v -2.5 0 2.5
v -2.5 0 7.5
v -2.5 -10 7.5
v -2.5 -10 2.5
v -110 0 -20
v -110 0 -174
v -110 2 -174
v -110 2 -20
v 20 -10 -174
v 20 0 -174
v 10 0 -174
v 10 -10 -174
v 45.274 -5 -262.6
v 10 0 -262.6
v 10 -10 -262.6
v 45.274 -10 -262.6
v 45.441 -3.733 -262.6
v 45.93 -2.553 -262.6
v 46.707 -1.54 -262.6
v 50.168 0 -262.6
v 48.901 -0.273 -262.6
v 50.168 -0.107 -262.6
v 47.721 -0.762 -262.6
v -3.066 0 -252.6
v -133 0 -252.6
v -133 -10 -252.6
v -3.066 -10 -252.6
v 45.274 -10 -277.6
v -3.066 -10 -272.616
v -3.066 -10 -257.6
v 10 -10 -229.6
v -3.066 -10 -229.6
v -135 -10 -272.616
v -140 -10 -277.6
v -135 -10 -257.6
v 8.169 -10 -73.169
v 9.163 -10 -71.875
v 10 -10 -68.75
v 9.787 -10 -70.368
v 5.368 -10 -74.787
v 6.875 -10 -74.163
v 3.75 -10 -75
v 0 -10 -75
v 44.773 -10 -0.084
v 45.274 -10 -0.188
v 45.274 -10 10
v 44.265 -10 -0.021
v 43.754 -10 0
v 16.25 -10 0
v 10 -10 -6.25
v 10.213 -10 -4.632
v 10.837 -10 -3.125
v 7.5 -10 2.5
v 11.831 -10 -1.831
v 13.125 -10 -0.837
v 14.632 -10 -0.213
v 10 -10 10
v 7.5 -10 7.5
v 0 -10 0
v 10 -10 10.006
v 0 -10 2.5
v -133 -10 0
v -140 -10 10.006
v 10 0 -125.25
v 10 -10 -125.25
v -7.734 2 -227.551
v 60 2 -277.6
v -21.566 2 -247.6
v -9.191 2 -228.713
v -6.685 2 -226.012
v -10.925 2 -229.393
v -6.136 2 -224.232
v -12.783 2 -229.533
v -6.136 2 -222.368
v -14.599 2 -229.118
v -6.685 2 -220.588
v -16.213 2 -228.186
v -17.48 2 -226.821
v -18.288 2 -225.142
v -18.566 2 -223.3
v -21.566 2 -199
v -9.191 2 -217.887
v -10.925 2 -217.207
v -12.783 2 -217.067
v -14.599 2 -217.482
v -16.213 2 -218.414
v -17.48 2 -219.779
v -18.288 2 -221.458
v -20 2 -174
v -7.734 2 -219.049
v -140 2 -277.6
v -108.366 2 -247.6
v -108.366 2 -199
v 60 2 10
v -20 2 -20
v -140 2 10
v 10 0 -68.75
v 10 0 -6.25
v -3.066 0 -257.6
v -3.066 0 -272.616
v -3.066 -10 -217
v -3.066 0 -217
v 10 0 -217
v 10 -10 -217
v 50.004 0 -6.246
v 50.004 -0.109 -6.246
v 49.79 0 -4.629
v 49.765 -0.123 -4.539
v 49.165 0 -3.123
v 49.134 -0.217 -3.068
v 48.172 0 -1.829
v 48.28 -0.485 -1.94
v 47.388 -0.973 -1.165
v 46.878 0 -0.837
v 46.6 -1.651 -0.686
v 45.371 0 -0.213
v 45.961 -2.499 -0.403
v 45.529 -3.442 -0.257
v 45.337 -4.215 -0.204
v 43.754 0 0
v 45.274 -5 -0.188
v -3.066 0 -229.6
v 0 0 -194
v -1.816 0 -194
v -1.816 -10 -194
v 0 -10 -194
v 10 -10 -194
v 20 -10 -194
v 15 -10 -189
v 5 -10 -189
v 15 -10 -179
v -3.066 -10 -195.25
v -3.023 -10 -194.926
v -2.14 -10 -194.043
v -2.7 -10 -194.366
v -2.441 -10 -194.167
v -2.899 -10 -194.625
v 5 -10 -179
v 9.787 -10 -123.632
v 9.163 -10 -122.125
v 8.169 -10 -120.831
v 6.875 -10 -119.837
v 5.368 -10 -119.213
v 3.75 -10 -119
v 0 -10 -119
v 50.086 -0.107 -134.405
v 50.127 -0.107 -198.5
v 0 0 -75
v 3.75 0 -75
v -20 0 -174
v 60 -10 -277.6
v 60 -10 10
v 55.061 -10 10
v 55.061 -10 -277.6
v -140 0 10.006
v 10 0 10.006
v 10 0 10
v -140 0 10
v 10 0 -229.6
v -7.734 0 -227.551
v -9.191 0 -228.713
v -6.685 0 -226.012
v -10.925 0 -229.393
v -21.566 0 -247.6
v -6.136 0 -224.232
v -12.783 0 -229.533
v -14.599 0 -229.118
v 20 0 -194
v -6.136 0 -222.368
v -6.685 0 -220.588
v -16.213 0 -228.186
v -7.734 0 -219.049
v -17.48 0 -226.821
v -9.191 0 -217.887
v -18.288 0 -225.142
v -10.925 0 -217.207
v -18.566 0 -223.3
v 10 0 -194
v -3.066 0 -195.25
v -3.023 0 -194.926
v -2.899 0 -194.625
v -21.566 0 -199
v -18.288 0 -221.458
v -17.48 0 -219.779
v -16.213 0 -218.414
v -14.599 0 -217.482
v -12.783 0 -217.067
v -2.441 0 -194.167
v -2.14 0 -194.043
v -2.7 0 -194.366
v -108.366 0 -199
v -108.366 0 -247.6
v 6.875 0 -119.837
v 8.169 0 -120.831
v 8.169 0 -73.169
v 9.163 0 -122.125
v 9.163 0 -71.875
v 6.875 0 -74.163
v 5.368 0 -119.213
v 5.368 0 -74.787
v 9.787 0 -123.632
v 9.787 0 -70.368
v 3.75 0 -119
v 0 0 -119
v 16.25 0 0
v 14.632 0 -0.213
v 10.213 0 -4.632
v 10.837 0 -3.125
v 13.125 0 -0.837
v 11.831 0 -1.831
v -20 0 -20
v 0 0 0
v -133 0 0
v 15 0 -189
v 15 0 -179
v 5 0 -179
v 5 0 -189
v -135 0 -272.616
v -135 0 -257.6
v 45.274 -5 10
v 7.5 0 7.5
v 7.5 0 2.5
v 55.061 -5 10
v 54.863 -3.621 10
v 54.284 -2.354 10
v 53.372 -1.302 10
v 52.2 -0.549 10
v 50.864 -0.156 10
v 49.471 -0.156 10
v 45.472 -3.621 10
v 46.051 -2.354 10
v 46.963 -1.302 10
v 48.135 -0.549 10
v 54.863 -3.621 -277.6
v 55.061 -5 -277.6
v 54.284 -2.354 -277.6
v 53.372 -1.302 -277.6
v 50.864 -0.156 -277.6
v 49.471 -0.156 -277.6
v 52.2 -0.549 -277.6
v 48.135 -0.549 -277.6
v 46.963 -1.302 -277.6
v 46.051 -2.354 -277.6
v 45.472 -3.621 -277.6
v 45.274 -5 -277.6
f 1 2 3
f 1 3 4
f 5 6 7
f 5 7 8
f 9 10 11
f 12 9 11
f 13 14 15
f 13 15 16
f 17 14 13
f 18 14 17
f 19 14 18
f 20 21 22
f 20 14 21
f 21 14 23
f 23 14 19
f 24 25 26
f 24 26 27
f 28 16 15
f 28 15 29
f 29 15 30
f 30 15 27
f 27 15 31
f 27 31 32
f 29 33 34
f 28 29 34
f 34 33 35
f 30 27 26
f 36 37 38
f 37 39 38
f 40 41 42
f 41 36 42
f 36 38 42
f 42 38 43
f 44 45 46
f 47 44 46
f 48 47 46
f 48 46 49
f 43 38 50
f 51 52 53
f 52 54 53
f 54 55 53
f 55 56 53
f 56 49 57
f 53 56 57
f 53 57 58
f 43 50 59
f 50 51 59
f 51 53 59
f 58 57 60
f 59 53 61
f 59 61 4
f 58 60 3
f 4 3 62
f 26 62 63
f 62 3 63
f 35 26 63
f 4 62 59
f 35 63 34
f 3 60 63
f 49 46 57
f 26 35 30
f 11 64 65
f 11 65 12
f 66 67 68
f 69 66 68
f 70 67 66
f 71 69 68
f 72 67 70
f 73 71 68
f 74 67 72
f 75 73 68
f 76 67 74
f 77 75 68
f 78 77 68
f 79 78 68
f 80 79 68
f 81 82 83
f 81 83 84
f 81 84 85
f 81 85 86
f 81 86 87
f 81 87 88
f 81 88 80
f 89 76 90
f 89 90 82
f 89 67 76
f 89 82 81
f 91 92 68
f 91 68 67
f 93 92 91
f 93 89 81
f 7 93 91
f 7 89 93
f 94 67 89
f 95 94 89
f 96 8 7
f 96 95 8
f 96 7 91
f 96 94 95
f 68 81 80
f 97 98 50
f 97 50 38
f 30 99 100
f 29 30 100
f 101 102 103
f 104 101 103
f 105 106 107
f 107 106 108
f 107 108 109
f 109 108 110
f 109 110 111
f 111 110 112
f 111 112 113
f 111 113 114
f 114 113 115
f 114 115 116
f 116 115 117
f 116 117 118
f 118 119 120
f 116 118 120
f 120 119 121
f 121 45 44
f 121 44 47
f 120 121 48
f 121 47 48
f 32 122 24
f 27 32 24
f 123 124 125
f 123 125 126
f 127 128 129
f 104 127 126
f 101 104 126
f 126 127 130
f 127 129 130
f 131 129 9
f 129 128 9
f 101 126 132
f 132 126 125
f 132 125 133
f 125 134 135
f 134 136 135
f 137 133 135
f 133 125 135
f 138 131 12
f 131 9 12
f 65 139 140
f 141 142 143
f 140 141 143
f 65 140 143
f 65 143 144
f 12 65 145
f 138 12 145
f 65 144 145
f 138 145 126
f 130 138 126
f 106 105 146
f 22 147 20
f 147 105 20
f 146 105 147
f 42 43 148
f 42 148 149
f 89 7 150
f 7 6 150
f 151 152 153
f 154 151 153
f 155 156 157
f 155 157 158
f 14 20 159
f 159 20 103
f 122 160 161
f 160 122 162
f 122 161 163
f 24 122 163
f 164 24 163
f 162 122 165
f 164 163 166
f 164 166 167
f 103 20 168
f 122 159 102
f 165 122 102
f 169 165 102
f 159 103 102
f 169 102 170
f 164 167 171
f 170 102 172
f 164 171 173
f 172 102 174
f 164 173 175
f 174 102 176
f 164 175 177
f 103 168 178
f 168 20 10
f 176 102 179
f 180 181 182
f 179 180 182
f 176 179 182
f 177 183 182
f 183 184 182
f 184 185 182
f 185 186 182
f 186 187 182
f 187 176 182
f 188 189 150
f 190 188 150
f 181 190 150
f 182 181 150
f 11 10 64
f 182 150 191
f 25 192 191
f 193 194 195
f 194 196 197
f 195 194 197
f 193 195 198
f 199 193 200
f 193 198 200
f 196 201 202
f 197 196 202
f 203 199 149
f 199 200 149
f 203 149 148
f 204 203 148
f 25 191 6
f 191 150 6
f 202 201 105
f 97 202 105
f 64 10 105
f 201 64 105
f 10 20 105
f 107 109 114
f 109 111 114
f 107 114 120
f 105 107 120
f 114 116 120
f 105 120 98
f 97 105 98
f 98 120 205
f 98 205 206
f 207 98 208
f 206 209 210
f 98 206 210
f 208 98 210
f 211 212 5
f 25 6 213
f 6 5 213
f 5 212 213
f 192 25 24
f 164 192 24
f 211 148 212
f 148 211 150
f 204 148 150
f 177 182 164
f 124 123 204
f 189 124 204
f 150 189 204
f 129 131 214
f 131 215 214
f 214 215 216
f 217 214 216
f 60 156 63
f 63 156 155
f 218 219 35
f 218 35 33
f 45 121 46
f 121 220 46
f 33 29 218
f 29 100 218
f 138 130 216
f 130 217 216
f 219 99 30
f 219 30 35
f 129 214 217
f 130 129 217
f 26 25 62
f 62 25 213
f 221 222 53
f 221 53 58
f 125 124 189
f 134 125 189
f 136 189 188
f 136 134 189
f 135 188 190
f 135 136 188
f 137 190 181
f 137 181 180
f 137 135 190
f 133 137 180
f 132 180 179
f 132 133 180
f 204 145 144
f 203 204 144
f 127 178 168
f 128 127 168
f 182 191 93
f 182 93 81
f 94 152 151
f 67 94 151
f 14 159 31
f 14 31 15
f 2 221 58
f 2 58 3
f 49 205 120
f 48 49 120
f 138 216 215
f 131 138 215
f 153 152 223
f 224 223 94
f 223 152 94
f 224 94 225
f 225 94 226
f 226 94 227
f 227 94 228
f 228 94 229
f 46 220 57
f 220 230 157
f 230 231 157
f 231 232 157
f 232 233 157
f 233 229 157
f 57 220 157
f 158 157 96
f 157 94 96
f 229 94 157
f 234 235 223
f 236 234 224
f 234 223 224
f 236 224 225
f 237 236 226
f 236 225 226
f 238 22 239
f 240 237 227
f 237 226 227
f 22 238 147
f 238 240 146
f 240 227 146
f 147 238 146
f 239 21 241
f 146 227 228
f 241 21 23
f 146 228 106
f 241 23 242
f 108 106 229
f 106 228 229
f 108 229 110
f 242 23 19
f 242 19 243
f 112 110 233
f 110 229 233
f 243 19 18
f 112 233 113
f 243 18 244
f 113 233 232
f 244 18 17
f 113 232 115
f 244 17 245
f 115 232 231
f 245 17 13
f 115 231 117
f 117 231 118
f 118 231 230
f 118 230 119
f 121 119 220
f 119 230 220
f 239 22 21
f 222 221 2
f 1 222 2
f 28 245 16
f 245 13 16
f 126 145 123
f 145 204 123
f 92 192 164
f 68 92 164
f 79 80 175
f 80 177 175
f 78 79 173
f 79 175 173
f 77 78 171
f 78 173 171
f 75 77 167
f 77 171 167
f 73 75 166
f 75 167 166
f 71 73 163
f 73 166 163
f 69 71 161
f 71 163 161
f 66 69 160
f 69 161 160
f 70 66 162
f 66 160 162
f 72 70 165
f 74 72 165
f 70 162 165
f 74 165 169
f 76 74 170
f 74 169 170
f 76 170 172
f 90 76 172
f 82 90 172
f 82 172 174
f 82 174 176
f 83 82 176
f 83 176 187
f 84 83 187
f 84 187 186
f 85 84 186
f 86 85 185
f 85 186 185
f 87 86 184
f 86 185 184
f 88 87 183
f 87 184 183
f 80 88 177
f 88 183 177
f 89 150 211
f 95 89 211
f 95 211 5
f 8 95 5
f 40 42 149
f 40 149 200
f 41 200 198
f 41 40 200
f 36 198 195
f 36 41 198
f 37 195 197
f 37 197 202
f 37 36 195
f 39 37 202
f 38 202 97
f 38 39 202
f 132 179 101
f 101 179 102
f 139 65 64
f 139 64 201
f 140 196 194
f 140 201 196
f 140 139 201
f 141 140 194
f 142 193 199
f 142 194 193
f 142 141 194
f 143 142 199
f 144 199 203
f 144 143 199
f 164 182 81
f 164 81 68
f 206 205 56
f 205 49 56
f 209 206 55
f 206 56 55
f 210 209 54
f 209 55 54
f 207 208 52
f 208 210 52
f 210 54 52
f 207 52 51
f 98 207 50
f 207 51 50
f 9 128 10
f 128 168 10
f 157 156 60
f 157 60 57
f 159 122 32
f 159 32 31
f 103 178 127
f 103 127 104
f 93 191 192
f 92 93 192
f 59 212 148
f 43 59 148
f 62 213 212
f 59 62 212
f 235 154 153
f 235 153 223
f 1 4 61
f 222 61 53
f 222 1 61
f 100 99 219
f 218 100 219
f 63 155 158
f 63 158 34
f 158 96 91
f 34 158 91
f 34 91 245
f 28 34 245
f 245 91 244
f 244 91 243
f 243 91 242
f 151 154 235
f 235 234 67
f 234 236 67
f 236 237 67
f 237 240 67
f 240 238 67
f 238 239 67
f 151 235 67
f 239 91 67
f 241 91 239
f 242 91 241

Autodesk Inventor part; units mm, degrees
ref_plane "YZ Plane" through (0, 0, 0) normal (1, 0, 0) x (0, 1, 0)
ref_plane "XZ Plane" through (0, 0, 0) normal (0, 1, 0) x (-1, 0, 0)
ref_plane "XY Plane" through (0, 0, 0) normal (0, 0, 1) x (1, 0, 0)
sketch "Sketch1" plane through (0, 0, 0) normal (0, 1, 0) x (-1, 0, 0)
  line L0 (0, 0) -> (0, -194)
  line L1 (0, -194) -> (130, -194)
  line L2 (130, -194) -> (130, 0)
  line L3 (130, 0) -> (0, 0)
  line L4 (0, -194) -> (123.8, -194)
  line L5 (126.866, -194) -> (126.866, -252.6)
  line L6 (126.866, -252.6) -> (3.066, -252.6)
  line L7 (3.066, -252.6) -> (3.066, -194)
  line L8 (140, 0) -> (140, -262.6)
  line L9 (140, -262.6) -> (0, -262.6)
  line L10 (140, 0) -> (140, 10)
  line L11 (-10, 0) -> (-10, -262.6)
  line L12 (-10, -262.6) -> (3.066, -262.6)
  line L13 (140, 10) -> (-10, 10)
  line L14 (-10, 10) -> (-10, 0)
  line L15 (-10, 10) -> (-60, 10)
  line L16 (-60, 10) -> (-60, -262.6)
  line L17 (-60, -262.6) -> (-10, -262.6)
  line L18 (108.366, -194) -> (108.366, -247.6)
  line L19 (21.566, -199) -> (21.566, -247.6)
  line L20 (110, -150.1456) -> (110, -20)
  line L21 (110, -174) -> (20, -174)
  line L22 (110, -174) -> (110, -150.1456)
  line L23 (102.8172, -20) -> (110, -20)
  line L24 (102.8172, -20) -> (20, -20)
  line L25 (20, -41.8625) -> (20, -20)
  line L26 (20, -41.8625) -> (20, -174)
  line L27 (21.566, -199) -> (21.566, -200.5)
  line L28 (108.366, -199) -> (21.566, -199)
  line L29 (108.366, -252.6) -> (108.366, -247.6)
  line L30 (108.366, -247.6) -> (21.566, -247.6)
  line L31 (21.566, -194) -> (12.316, -194)
  line L32 (12.316, -217.05) -> (12.316, -223.3)
  circle A0 centre (12.316, -223.3) radius 6.25
  line L33 (130, -194) -> (130, -252.6)
  line L34 (130, -252.6) -> (126.866, -252.6)
  line L35 (0, -194) -> (0, -252.6)
  line L36 (0, -252.6) -> (3.066, -252.6)
  line L37 (102.8172, -247.6) -> (102.8172, -267.6)
  line L38 (102.8172, -267.6) -> (140, -267.6)
  line L39 (140, -267.6) -> (140, -262.6)
  line L40 (102.8172, -267.6) -> (0, -267.6)
  line L41 (0, -267.6) -> (0, -252.6)
  line L42 (130, -252.6) -> (130, -267.6)
  line L43 (126.866, -252.6) -> (126.866, -267.6)
  line L44 (3.066, -252.6) -> (3.066, -267.6)
  line L45 (3.066, -194) -> (3.066, -217)
  line L46 (3.066, -252.6) -> (3.066, -229.6)
  line L47 (3.066, -217) -> (0, -217)
  line L48 (3.066, -229.6) -> (0, -229.6)
  line L49 (0, -217) -> (-10, -217)
  line L50 (0, -229.6) -> (-10, -229.55)
  line L51 (0, -267.6) -> (-60, -267.6)
  line L52 (-60, -267.6) -> (-60, -262.6)
  line L53 (-10, -262.6) -> (-10, -267.6)
  line L54 (-10, -194) -> (-20, -194)
  line L55 (-20, -194) -> (-20, -174)
  line L56 (-20, -174) -> (-10, -174)
  line L57 (-10, 0) -> (-10, -10)
  line L58 (-10, -10) -> (-20, -10)
  line L59 (-20, -10) -> (-20, 0)
  line L60 (37.3032, -247.6) -> (37.3032, -277.6)
  line L61 (37.3032, -277.6) -> (-60, -277.6)
  line L62 (-60, -277.6) -> (-60, -267.6)
  line L63 (140, -267.6) -> (140, -277.6)
  line L64 (140, -277.6) -> (37.3032, -277.6)
  dimension "d18" = 12.5
  dimension "d0" = 194
  dimension "d1" = 130
  dimension "d2" = 123.8
  dimension "d3" = 58.6
  dimension "d4" = 10
  dimension "d5" = 262.6
  dimension "d6" = 10
  dimension "d7" = 10
  dimension "d8" = 50
  dimension "d14" = 6.5
  dimension "d15" = 5
  dimension "d16" = 5
  dimension "d17" = 9.25
  dimension "d19" = 20
  dimension "d29" = 23
  dimension "d30" = 23
  dimension "d46" = 10
  dimension "d47" = 10
  dimension "d55" = 30
sketch "Sketch2" plane through (0, 0, 0) normal (0, 1, 0) x (-1, 0, 0)
  line L0 (0, 0) -> (0, -194)
  line L1 (0, -194) -> (0, -109)
  line L2 (0, 0) -> (0, -75)
  line L3 (0, -194) -> (0, -119)
  line L4 (0, -119) -> (-10, -119)
  line L5 (-10, -119) -> (-10, -194)
  line L6 (-10, -194) -> (0, -194)
  line L7 (0, -75) -> (-10, -75)
  line L8 (0, 0) -> (-10, 0)
  line L9 (-10, 0) -> (-10, -75)
  line L10 (-10, -262.6) -> (0, -262.6)
  line L11 (0, -262.6) -> (0, -194)
  line L12 (-10, -194) -> (-10, -262.6)
  line L13 (0, -194) -> (0, -262.6)
  line L14 (0, -262.6) -> (3.066, -262.6)
  line L15 (3.066, -262.6) -> (3.066, -252.6)
  line L16 (3.066, -252.6) -> (0, -252.6)
  line L17 (0, -252.6) -> (0, -194)
  line L18 (3.066, -194) -> (3.066, -252.6)
  line L19 (3.066, -252.6) -> (3.066, -224.05)
  line L20 (3.066, -252.6) -> (3.066, -229.6)
  line L21 (3.066, -194) -> (3.066, -217)
  line L22 (3.066, -217) -> (0, -217)
  line L23 (3.066, -229.6) -> (0, -229.6)
  line L24 (0, -217) -> (-10, -217)
  line L25 (0, -229.6) -> (-10, -229.6)
  line L26 (3.066, -252.6) -> (126.866, -252.6)
  line L27 (126.866, -252.6) -> (126.866, -262.6)
  line L28 (126.866, -262.6) -> (3.066, -262.6)
  line L29 (3.066, -252.6) -> (3.066, -262.6)
  line L30 (126.866, -252.6) -> (130, -252.6)
  line L31 (130, -252.6) -> (130, -262.6)
  line L32 (130, -262.6) -> (126.866, -262.6)
  line L33 (130, -252.6) -> (130, 0)
  line L34 (130, 0) -> (0, 0)
  line L35 (130, 0) -> (140, 0)
  line L36 (140, 0) -> (140, -194)
  line L37 (140, -194) -> (140, -252.6)
  line L38 (140, -252.6) -> (130, -252.6)
  line L39 (140, -267.6319) -> (140, -252.6)
  line L40 (140, -267.6319) -> (-10, -267.6319)
  line L41 (-10, -267.6319) -> (-10, -229.6)
  line L42 (-10, 10.006) -> (140, 10.006)
  line L43 (140, 10.006) -> (140, 0)
  line L44 (-10, 10.006) -> (-10, 0)
  line L45 (-10, -75) -> (-10, 0)
  line L46 (0, 0) -> (-10, 0)
  line L47 (0, 0) -> (0, -75)
  line L48 (-10, -75) -> (0, -75)
  line L49 (0, -119) -> (-10, -119)
  line L50 (-10, -194) -> (0, -194)
  line L51 (0, -119) -> (0, -194)
  line L52 (-10, -194) -> (-10, -119)
  line L53 (3.066, -194) -> (0, -194)
  line L54 (3.066, -194) -> (3.066, -217)
  line L55 (-10, -217) -> (3.066, -217)
  line L56 (-10, -217) -> (-10, -194)
  line L57 (-10, -229.6) -> (-10, -267.6319)
  line L58 (3.066, -267.6319) -> (3.066, -229.6)
  line L59 (3.066, -229.6) -> (-9.4866, -229.6)
  line L60 (0, -194) -> (0, 0)
  line L61 (-10, -194) -> (-20, -194)
  line L62 (-20, -194) -> (-20, -184)
  line L63 (-20, -184) -> (-10, -184)
  line L64 (-20, -184) -> (-20, -174)
  line L65 (-20, -174) -> (-10, -174)
  line L66 (-10, -184) -> (-10, -189)
  line L67 (-5, -189) -> (-5, -179)
  line L68 (-5, -179) -> (-15, -179)
  line L69 (-15, -179) -> (-15, -189)
  line L70 (-15, -189) -> (-5, -189)
  line L71 (0, 0) -> (0, 2.5)
  line L72 (0, 2.5) -> (-7.5, 2.5)
  line L73 (-7.5, 2.5) -> (-7.5, 7.5)
  line L74 (-7.5, 7.5) -> (0, 7.5)
  line L75 (0, 7.5) -> (2.5, 7.5)
  line L76 (2.5, 7.5) -> (2.5, 2.5)
  line L77 (2.5, 2.5) -> (0, 2.5)
  line L78 (-10, -282.6) -> (-10, -267.6319)
  line L79 (50.7455, -277.6) -> (-5, -277.6)
  line L80 (-5, -277.6) -> (-5, -257.6)
  line L81 (-5, -257.6) -> (50.7455, -257.6)
  line L82 (50.7455, -257.6) -> (135, -257.6)
  line L83 (135, -257.6) -> (135, -277.6)
  line L84 (135, -277.6) -> (50.7455, -277.6)
  line L85 (140, -277.6) -> (-60, -277.6)
  line L86 (-60, -277.6) -> (-60, -262.6)
  line L87 (-10, -262.6) -> (-60, -262.6)
  line L88 (140, -277.6) -> (140, -267.6319)
  line L89 (3.066, -267.6319) -> (3.066, -272.6159)
  line L90 (3.066, -272.6159) -> (135, -272.6159)
  line L91 (130, -252.6) -> (133, -252.6)
  line L92 (133, -252.6) -> (133, 0)
  line L93 (133, 0) -> (130, 0)
  point P0 (-10, -277.6)
  point P1 (135, -267.6319)
  point P2 (-5, -267.6319)
  point P3 (3.066, -257.6)
  dimension "d22" = 75
  dimension "d23" = 75
  dimension "d24" = 10
  dimension "d25" = 262.6
  dimension "d27" = 23
  dimension "d28" = 23
  dimension "d48" = 10
  dimension "d49" = 10
  dimension "d50" = 10
  dimension "d51" = 2.5
  dimension "d52" = 7.5
  dimension "d53" = 5
  dimension "d54" = 2.5
  dimension "d67" = 3
extrude "Extrusion1" add sketch "Sketch2" against normal blind 10 contours L0 L7 L9 L8 | L8 L44 L42 L43 L35 L34 | L31 L82 L27 L30 | L38 L39 L40 L83 L82 L31 | L35 L36 L37 L38 L92 | L0 L6 L5 L70 L67 L68 L4 | L27 L82 L81 L15 L26 | L11 L24 L12 L6 | L53 L18 L22 L11 | L15 L81 L11 L16 | L16 L11 L23 L18 | L61 L62 L63 L69 L70 L5 | L5 L68 L69 L63 L64 L65 | L15 L14 L11 L81 | L11 L81 L80 L10 L12 L25 | L40 L88 L85 L83 | L58 L40 L80 L10 L14 | L11 L10 L80 L81 | L89 L90 L83 L84 L79 L80 L40 | L80 L85 L78 L40 | L40 L41 L10 L80 | L41 L78 L85 L86 L87
extrude "Extrusion2" add sketch "Sketch1" along normal blind 2 contours L3 L2 L1 L0 | L0 L35 L49 L11 L14 L13 L10 L8 L9 L42 L33 L2 L3 | L1 L7 L47 L35 | L1 L18 L28 L19 L30 L60 L6 L7 | L47 L7 L48 L35 | L35 L50 L11 L49 | L33 L34 L5 L1 | L48 L7 L36 L35 | L35 L41 L12 L11 L50 | L11 L17 L16 L15 L14 L56 L55 L54 | L5 L6 L29 L18 L1 | L42 L9 L43 L34 | L36 L44 L9 L41 | L54 L55 L56 L11 | L43 L9 L37 L6 | L42 L38 L43 L9 | L9 L39 L38 L42 | L6 L60 L9 L44 | L41 L51 L53 L12 | L9 L44 L40 L41 | L53 L51 L52 L17 | L6 L37 L30 L29 | L43 L38 L37 L9 | L38 L63 L64 L60 L40 | L60 L30 L37 L6 | L6 L37 L9 L60 | L9 L60 L40 L44 | L40 L60 L61 L62 L51 | L37 L40 L60 L9
sketch "Sketch3" plane through (0, 0, 0) normal (0, -1, 0) x (1, 0, 0)
  line L0 (10, -262.6) -> (10, -194) projected
  line L1 (60, -267.6) -> (-140, -267.6) projected
  line L2 (10, -267.6319) -> (60, -267.6)
  line L3 (60, 10) -> (60, -267.6) projected
  line L4 (60, -267.6) -> (60, 10)
  line L5 (10, 10) -> (10, -75) projected
  line L6 (60, 10) -> (10, 10)
  line L7 (10, 10) -> (10, 0)
  line L8 (10, 0) -> (60, 0)
  line L9 (60, 0) -> (50, 0)
  line L10 (50, 0) -> (50.1707, -267.6063)
  line L11 (50.1707, -267.6063) -> (50.1643, -257.6063)
  line L12 (50.1643, -257.6063) -> (10, -257.6319)
  line L13 (50.1643, -257.6063) -> (60, -257.6063)
  point P0 (0, 0)
  point P1 (10, -229.6)
  point P2 (10, -267.6)
  point P3 (50.1707, -267.6)
  dimension "d35" = 10
  dimension "d36" = 10
extrude "Extrusion3" add sketch "Sketch3" along normal blind 10
fillet "Fillet2" radius 6.25 4 edges at (10, -5, -75) (10, -5, -119) (10, -5, 0) (50, -5, 0)
fillet "Fillet3" radius 1.25 1 edges at (-3.066, -5, -194)
sketch "Sketch8" plane through (-140, 2, 10) normal (0, 0, 1) x (1, 0, 0)
  line L0 (190.1675, -12) -> (190.1675, -2) projected
  circle A0 centre (190.1675, -7) radius 4.8934
  line L1 (185.2741, -7) -> (185.2741, -11.8934)
  line L2 (185.2741, -11.8934) -> (195.0609, -11.8934)
  line L3 (195.0609, -11.8934) -> (195.0609, -7)
  line L4 (185.2741, -11.8934) -> (185.2741, -12.5715)
  line L5 (185.2741, -12.5715) -> (195.0609, -12.5715)
  line L6 (195.0609, -12.5715) -> (195.0609, -11.8934)
  point P0 (140, -2)
extrude "Extrusion7" cut sketch "Sketch8" against normal blind 299.5
sketch "Sketch9" plane through (0, -10, 0) normal (0, -1, 0) x (1, 0, 0)
  line L0 (-135, -272.6159) -> (-135, -257.6) projected
  line L1 (-135, -272.6159) -> (-135, -257.6)
  line L2 (-135, -257.6) -> (-3.066, -257.6)
  line L3 (-3.066, -257.6) -> (-3.066, -272.6159)
  line L4 (-3.066, -272.6159) -> (-135, -272.6159) projected
  line L5 (-3.066, -272.6159) -> (-135, -272.6159)
  line L6 (5, -189) -> (15, -189) projected
  line L7 (5, -179) -> (5, -189) projected
  line L8 (5, -189) -> (5, -179)
  line L9 (5, -179) -> (15.0244, -179)
  line L10 (15.0244, -179) -> (15.0244, -189)
  line L11 (15.0244, -189) -> (5, -189)
  line L12 (-2.5, 2.5) -> (7.5, 2.5) projected
  line L13 (-2.5, 7.5) -> (-2.5, 2.5) projected
  line L14 (-2.5, 2.5) -> (-2.5, 7.5)
  line L15 (5, -189) -> (5, -188.5)
  line L16 (14.5, -188.5) -> (14.5, -179.5)
  line L17 (14.5, -179.5) -> (5.5, -179.5)
  line L18 (5.5, -179.5) -> (5.5, -188.5)
  line L19 (5.5, -188.5) -> (14.5, -188.5)
  line L20 (60, -277.6) -> (-140, -277.6) projected
  line L21 (-3.566, -271.6357) -> (-3.566, -258.1)
  line L22 (-3.566, -271.6357) -> (-3.566, -272.1159)
  line L23 (-134.5, -271.0768) -> (-134.5, -272.1159)
  line L24 (-134.5, -271.0768) -> (-134.5, -258.1)
  line L25 (-134.5, -272.1159) -> (-3.566, -272.1159)
  line L26 (-3.566, -258.1) -> (-134.5, -258.1)
  line L27 (7.5, 7.5) -> (7.5, 2.5) projected
  line L28 (7.5, 2.5) -> (7.5, 7.5)
  line L29 (-2.5, 2.5) -> (7.5, 2.5)
  line L30 (7.5, 7.5) -> (-2.5, 7.5)
  line L31 (-2.5, 7.5) -> (-2.5, 7)
  line L32 (-2, 7) -> (7, 7)
  line L33 (-2, 3) -> (-2, 7)
  line L34 (7.5, 7.5) -> (7, 7.5)
  line L35 (7, 7) -> (7, 3)
  line L36 (7.5, 2.5) -> (7.5, 3)
  line L37 (7, 3) -> (-2, 3)
  point P0 (0, 0)
  dimension "d68" = 0.5
  dimension "d69" = 9.5
  dimension "d70" = 9
  dimension "d71" = 9
properties part number "iphone-playbook dock"
